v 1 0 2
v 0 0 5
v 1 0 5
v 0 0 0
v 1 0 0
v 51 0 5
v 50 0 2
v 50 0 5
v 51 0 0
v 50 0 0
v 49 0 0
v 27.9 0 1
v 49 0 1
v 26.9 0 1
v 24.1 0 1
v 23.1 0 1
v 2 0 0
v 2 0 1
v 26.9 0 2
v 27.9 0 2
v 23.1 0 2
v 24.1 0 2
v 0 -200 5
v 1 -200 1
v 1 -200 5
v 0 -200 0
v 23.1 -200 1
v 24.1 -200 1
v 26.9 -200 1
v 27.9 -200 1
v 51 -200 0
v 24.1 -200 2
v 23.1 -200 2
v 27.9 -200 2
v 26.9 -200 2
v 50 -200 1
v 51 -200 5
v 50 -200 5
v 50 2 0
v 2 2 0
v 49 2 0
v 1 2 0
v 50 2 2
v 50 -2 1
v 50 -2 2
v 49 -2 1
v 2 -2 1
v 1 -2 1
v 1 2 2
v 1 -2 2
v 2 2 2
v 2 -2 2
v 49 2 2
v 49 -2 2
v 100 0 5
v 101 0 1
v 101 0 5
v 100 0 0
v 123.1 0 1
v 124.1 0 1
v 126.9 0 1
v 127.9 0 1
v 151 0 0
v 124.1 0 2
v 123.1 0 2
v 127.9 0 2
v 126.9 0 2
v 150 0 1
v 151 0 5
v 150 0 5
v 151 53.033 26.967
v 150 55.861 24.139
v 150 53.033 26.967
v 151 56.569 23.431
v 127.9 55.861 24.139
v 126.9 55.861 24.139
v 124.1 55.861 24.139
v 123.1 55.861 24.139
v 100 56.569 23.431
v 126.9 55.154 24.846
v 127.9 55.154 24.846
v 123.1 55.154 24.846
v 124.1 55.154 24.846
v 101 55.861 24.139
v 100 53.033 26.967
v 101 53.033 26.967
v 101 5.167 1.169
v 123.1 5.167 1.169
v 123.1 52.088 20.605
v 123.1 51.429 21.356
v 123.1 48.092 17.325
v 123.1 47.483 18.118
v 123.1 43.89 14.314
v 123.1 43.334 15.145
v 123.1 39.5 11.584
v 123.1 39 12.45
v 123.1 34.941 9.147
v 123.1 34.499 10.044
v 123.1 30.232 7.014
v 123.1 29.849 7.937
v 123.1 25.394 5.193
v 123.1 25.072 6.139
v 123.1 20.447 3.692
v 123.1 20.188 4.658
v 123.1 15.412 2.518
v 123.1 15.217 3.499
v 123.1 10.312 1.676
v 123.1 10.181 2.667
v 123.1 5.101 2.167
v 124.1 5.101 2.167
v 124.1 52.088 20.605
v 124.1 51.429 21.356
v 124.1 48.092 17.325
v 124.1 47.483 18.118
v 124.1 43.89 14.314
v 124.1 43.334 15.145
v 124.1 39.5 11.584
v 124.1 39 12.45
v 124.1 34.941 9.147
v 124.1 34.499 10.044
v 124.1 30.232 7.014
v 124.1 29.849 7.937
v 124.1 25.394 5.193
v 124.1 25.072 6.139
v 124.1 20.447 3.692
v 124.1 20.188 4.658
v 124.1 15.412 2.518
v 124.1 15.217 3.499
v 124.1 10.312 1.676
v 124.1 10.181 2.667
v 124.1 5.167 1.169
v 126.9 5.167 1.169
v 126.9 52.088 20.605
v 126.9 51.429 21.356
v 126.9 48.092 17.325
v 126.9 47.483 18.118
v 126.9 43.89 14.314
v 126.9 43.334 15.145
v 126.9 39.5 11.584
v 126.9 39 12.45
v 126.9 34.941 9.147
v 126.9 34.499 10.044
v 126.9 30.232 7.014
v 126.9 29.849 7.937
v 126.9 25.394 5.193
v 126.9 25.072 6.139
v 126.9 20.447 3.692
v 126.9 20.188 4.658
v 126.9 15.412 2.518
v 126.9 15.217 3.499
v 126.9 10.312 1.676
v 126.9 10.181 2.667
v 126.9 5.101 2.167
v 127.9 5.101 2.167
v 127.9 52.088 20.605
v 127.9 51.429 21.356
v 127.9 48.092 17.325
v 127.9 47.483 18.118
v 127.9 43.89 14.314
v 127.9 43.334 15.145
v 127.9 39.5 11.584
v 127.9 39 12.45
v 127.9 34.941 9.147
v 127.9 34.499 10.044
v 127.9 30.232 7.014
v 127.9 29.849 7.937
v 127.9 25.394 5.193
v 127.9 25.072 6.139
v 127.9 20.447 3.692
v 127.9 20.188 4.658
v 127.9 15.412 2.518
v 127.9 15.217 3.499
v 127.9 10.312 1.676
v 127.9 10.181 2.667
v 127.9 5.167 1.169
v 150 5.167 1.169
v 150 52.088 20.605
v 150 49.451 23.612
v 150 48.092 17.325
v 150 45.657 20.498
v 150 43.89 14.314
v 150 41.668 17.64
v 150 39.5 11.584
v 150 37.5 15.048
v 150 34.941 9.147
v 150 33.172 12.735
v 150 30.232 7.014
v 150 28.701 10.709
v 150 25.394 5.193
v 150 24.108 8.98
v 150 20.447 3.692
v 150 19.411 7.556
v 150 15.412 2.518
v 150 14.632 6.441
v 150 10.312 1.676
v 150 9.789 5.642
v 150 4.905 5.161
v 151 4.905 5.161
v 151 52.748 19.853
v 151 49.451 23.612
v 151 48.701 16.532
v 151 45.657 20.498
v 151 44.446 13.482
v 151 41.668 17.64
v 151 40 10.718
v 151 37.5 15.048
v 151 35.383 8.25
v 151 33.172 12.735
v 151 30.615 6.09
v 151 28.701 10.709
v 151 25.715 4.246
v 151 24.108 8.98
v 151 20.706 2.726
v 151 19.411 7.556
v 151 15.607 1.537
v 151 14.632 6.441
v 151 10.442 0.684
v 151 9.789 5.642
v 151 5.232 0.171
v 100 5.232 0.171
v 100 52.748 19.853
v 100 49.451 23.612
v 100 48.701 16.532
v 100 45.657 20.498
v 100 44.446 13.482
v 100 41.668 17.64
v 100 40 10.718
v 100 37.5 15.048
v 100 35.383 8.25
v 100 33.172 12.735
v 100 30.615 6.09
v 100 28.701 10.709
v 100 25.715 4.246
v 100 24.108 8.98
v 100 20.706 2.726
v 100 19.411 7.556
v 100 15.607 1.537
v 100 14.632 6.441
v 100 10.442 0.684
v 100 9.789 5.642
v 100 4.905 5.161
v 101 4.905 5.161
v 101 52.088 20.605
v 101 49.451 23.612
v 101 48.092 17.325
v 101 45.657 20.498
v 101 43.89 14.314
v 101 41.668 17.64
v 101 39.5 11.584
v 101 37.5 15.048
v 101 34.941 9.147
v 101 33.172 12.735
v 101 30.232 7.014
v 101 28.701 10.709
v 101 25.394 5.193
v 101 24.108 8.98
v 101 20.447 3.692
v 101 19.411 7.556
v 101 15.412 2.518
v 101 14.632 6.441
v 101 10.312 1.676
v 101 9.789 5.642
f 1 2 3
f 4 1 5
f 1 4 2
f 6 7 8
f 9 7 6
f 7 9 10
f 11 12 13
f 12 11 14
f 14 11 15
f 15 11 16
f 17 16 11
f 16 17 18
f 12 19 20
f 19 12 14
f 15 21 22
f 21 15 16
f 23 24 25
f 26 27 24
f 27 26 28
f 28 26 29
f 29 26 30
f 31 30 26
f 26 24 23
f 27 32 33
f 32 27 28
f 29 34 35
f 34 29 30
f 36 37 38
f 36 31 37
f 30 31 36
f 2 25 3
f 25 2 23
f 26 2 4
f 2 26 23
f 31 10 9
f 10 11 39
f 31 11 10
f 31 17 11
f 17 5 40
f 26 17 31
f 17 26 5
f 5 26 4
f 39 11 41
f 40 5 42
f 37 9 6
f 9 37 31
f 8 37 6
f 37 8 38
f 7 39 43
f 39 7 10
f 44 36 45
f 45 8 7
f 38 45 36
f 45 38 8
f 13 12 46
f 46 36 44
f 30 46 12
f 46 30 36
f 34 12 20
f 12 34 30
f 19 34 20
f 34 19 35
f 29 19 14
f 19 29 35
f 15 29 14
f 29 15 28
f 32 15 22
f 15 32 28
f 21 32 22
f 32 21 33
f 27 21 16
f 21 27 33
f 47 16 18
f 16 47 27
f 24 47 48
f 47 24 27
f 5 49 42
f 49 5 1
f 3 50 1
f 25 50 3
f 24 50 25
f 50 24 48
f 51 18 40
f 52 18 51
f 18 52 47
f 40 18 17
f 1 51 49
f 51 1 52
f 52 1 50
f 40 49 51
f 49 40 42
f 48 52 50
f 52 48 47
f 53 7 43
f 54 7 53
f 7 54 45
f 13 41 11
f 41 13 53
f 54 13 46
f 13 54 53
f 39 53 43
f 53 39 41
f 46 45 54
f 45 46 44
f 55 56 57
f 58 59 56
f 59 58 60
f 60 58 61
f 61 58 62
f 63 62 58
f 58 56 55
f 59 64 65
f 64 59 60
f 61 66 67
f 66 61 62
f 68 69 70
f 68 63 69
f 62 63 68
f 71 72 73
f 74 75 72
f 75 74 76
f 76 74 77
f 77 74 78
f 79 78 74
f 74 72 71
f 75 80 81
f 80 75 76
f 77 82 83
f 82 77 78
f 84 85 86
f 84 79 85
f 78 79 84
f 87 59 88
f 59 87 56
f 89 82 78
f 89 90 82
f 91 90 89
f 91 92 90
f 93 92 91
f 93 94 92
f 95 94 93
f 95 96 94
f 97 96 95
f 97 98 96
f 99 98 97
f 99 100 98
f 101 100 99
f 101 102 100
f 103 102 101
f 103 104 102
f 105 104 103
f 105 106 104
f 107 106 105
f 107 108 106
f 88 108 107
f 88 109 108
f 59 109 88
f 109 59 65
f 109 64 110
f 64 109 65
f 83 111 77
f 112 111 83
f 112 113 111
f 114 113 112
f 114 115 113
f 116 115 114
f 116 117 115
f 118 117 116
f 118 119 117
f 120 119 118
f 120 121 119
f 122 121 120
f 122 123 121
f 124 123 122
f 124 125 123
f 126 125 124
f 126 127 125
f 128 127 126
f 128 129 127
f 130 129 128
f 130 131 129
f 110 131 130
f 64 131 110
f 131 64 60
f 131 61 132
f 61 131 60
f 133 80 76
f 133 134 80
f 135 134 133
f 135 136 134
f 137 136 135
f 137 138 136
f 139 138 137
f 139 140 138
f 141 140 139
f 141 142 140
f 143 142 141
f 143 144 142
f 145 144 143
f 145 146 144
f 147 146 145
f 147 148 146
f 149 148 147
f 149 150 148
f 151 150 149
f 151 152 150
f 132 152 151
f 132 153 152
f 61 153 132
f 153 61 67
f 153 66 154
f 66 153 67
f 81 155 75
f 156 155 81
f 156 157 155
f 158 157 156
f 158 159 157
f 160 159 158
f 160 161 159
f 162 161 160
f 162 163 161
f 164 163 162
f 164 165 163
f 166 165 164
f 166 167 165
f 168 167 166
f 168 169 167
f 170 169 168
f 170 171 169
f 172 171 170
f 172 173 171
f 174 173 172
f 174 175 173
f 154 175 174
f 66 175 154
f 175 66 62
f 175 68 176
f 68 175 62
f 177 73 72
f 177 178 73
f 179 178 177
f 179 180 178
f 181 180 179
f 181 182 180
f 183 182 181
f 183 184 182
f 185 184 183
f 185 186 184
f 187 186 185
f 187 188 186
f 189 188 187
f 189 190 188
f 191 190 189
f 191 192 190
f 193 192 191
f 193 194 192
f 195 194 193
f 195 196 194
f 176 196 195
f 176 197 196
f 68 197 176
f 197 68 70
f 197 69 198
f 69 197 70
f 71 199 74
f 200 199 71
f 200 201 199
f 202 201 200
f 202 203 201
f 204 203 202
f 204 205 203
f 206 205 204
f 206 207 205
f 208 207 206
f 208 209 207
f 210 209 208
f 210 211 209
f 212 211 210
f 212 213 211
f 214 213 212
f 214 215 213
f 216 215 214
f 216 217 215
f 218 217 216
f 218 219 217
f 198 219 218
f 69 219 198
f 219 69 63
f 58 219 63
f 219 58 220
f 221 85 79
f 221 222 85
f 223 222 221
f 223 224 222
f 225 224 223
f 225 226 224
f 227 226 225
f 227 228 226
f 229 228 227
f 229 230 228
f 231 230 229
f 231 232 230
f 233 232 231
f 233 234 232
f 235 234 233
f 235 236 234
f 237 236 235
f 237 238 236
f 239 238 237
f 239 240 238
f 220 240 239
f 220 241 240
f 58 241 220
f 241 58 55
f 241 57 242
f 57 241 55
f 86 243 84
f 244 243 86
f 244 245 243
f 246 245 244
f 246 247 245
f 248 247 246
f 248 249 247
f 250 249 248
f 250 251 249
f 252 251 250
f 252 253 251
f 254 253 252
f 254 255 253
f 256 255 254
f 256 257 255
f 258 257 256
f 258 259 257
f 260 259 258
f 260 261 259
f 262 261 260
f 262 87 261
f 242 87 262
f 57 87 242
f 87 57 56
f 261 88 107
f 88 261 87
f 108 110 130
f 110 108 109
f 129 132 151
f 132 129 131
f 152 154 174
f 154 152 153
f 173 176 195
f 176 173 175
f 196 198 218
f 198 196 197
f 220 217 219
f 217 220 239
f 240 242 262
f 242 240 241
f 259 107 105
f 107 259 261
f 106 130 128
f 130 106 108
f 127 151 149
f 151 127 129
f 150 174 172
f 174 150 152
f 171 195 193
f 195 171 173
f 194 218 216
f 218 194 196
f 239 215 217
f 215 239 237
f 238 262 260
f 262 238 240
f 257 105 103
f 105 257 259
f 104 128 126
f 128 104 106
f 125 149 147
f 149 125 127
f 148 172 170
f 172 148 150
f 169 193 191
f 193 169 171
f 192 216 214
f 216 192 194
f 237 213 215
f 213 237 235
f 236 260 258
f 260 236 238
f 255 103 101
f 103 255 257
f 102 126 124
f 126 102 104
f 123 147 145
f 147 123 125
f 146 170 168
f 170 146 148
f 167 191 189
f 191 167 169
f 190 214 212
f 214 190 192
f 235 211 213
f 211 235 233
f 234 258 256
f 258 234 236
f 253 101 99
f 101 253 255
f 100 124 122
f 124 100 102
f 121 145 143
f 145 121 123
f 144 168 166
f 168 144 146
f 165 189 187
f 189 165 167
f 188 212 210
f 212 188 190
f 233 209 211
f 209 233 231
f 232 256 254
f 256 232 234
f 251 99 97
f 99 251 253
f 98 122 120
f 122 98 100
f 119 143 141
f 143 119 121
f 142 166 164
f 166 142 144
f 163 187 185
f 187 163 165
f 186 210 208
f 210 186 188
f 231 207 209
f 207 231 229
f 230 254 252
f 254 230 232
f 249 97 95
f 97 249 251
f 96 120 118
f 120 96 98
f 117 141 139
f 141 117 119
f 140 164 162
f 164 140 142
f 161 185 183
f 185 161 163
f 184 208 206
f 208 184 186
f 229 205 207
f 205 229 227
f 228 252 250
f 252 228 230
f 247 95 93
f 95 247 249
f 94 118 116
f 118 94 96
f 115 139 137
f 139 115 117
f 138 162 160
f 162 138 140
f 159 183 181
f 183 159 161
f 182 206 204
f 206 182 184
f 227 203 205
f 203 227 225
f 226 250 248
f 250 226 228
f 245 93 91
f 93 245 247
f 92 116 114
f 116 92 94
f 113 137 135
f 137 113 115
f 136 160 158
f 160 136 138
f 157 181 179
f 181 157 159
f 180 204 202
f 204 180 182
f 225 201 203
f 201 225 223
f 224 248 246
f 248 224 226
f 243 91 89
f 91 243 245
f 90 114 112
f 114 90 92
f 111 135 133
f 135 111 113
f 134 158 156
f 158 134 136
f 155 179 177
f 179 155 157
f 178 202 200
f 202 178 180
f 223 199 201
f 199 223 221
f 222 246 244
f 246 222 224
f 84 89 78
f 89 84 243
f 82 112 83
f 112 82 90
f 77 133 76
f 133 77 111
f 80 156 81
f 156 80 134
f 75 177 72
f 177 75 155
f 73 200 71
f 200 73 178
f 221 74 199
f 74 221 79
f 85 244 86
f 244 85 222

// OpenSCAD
$fn=100;
width=50;
chanW=3;
th=1;
sLen=200;


rotate([90,0,0]) linear_extrude(sLen) prof(width, th, chanW);

translate([th,-2,0]) 
cube([th,4*th, 2*th]);

translate([width - th,-2,0]) 
cube([th,4*th, 2*th]);

translate([100,00,80]) rotate([0,90,0]) rotate_extrude(angle=45) rotate([0,0,90]) translate([0,-80,0]) #prof(width, th, chanW);

module prof(width, th, chanW) {
    tl=0.4;
polygon(
[
[0,0],[width+th, 0],[width+th, 5*th],[width, 5*th],[width, th],
[width/2 + chanW/2 + th+tl, th],[width/2 + chanW/2 + th+tl, 2*th],[width/2 + chanW/2 + th, 2*th],[width/2 + chanW/2+tl, 2*th],[width/2 + chanW/2+tl, th],
[width/2 - chanW/2-tl, th],[width/2 - chanW/2-tl, 2*th],[width/2 - chanW/2+th-tl, 2*th],[width/2 - chanW/2+th-tl, th],[th, th],
[th, 5*th],[0, 5*th]
]);
}
